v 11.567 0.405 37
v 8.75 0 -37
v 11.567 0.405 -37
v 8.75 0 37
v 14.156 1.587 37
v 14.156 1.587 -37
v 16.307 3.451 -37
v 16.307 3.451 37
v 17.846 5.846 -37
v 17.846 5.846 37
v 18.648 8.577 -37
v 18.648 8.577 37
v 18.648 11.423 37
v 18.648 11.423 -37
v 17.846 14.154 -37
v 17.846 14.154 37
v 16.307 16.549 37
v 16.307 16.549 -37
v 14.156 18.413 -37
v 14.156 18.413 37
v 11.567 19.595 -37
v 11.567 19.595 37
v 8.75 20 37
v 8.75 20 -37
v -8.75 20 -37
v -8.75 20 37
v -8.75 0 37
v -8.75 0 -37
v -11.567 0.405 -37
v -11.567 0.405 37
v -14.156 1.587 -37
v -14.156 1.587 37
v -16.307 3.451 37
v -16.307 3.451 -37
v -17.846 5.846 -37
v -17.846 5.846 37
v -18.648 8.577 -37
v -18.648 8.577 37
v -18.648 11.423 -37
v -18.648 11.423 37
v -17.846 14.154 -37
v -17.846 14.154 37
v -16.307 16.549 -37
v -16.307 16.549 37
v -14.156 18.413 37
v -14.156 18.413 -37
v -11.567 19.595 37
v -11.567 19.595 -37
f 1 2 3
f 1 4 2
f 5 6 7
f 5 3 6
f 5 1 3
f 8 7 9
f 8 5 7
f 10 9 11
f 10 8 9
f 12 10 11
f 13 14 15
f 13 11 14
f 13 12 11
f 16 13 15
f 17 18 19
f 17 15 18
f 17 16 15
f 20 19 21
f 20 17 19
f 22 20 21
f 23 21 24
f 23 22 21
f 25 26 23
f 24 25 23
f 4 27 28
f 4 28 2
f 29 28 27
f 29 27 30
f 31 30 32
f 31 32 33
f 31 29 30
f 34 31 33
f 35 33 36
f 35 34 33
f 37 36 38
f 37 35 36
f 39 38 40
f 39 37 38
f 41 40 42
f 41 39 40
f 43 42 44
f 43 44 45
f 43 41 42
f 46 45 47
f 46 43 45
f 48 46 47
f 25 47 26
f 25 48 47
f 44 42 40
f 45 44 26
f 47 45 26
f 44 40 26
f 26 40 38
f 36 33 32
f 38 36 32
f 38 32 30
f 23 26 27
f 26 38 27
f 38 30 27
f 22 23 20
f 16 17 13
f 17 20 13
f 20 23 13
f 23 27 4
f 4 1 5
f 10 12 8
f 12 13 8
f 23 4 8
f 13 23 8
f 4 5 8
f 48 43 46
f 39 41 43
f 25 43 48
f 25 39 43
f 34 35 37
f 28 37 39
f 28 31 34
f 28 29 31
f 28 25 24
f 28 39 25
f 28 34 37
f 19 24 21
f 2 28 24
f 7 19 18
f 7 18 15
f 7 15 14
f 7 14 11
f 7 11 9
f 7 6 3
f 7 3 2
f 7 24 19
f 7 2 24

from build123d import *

# Parameters (mm, degrees)
SKETCH1_W           = 37.5
SKETCH1_H           = 74
BOSS_EXTRUDE1_DEPTH = 20
FILLET3_RADIUS      = 10
FILLET3_LENGTH      = 74
FILLET4_RADIUS      = 10
FILLET4_LENGTH      = 74


with BuildPart() as part:
    # Sketch1 → Boss-Extrude1 (new body)
    with BuildSketch(Plane(origin=(0, 0, 0), x_dir=(1, 0, 0), z_dir=(0, 1, 0))):
        Rectangle(SKETCH1_W, SKETCH1_H)
    extrude(amount=BOSS_EXTRUDE1_DEPTH)

    # Fillet3: full round fillet: the end face becomes a half cylinder, R = half its width
    fillet3_face = Plane((-18.75, 10, 0), x_dir=(0, 0, -1), z_dir=(-1, 0, 0))  # on the end face: x along it, z out of the body
    fillet3_slab = fillet3_face.offset(-FILLET3_RADIUS / 2) * Box(FILLET3_LENGTH, 2 * FILLET3_RADIUS, FILLET3_RADIUS, mode=Mode.PRIVATE)  # the body's end, R deep
    fillet3_round = Plane((-8.75, 10, 0), x_dir=(-1, 0, 0), z_dir=(0, 0, -1)) * Cylinder(FILLET3_RADIUS, FILLET3_LENGTH, mode=Mode.PRIVATE)  # its axis R under the face
    add(fillet3_slab - fillet3_round, mode=Mode.SUBTRACT)

    # Fillet4: full round fillet: the end face becomes a half cylinder, R = half its width
    fillet4_face = Plane((18.75, 10, 0), x_dir=(0, 0, 1), z_dir=(1, 0, 0))  # on the end face: x along it, z out of the body
    fillet4_slab = fillet4_face.offset(-FILLET4_RADIUS / 2) * Box(FILLET4_LENGTH, 2 * FILLET4_RADIUS, FILLET4_RADIUS, mode=Mode.PRIVATE)  # the body's end, R deep
    fillet4_round = Plane((8.75, 10, 0), x_dir=(1, 0, 0), z_dir=(0, 0, 1)) * Cylinder(FILLET4_RADIUS, FILLET4_LENGTH, mode=Mode.PRIVATE)  # its axis R under the face
    add(fillet4_slab - fillet4_round, mode=Mode.SUBTRACT)


solid = part.part
